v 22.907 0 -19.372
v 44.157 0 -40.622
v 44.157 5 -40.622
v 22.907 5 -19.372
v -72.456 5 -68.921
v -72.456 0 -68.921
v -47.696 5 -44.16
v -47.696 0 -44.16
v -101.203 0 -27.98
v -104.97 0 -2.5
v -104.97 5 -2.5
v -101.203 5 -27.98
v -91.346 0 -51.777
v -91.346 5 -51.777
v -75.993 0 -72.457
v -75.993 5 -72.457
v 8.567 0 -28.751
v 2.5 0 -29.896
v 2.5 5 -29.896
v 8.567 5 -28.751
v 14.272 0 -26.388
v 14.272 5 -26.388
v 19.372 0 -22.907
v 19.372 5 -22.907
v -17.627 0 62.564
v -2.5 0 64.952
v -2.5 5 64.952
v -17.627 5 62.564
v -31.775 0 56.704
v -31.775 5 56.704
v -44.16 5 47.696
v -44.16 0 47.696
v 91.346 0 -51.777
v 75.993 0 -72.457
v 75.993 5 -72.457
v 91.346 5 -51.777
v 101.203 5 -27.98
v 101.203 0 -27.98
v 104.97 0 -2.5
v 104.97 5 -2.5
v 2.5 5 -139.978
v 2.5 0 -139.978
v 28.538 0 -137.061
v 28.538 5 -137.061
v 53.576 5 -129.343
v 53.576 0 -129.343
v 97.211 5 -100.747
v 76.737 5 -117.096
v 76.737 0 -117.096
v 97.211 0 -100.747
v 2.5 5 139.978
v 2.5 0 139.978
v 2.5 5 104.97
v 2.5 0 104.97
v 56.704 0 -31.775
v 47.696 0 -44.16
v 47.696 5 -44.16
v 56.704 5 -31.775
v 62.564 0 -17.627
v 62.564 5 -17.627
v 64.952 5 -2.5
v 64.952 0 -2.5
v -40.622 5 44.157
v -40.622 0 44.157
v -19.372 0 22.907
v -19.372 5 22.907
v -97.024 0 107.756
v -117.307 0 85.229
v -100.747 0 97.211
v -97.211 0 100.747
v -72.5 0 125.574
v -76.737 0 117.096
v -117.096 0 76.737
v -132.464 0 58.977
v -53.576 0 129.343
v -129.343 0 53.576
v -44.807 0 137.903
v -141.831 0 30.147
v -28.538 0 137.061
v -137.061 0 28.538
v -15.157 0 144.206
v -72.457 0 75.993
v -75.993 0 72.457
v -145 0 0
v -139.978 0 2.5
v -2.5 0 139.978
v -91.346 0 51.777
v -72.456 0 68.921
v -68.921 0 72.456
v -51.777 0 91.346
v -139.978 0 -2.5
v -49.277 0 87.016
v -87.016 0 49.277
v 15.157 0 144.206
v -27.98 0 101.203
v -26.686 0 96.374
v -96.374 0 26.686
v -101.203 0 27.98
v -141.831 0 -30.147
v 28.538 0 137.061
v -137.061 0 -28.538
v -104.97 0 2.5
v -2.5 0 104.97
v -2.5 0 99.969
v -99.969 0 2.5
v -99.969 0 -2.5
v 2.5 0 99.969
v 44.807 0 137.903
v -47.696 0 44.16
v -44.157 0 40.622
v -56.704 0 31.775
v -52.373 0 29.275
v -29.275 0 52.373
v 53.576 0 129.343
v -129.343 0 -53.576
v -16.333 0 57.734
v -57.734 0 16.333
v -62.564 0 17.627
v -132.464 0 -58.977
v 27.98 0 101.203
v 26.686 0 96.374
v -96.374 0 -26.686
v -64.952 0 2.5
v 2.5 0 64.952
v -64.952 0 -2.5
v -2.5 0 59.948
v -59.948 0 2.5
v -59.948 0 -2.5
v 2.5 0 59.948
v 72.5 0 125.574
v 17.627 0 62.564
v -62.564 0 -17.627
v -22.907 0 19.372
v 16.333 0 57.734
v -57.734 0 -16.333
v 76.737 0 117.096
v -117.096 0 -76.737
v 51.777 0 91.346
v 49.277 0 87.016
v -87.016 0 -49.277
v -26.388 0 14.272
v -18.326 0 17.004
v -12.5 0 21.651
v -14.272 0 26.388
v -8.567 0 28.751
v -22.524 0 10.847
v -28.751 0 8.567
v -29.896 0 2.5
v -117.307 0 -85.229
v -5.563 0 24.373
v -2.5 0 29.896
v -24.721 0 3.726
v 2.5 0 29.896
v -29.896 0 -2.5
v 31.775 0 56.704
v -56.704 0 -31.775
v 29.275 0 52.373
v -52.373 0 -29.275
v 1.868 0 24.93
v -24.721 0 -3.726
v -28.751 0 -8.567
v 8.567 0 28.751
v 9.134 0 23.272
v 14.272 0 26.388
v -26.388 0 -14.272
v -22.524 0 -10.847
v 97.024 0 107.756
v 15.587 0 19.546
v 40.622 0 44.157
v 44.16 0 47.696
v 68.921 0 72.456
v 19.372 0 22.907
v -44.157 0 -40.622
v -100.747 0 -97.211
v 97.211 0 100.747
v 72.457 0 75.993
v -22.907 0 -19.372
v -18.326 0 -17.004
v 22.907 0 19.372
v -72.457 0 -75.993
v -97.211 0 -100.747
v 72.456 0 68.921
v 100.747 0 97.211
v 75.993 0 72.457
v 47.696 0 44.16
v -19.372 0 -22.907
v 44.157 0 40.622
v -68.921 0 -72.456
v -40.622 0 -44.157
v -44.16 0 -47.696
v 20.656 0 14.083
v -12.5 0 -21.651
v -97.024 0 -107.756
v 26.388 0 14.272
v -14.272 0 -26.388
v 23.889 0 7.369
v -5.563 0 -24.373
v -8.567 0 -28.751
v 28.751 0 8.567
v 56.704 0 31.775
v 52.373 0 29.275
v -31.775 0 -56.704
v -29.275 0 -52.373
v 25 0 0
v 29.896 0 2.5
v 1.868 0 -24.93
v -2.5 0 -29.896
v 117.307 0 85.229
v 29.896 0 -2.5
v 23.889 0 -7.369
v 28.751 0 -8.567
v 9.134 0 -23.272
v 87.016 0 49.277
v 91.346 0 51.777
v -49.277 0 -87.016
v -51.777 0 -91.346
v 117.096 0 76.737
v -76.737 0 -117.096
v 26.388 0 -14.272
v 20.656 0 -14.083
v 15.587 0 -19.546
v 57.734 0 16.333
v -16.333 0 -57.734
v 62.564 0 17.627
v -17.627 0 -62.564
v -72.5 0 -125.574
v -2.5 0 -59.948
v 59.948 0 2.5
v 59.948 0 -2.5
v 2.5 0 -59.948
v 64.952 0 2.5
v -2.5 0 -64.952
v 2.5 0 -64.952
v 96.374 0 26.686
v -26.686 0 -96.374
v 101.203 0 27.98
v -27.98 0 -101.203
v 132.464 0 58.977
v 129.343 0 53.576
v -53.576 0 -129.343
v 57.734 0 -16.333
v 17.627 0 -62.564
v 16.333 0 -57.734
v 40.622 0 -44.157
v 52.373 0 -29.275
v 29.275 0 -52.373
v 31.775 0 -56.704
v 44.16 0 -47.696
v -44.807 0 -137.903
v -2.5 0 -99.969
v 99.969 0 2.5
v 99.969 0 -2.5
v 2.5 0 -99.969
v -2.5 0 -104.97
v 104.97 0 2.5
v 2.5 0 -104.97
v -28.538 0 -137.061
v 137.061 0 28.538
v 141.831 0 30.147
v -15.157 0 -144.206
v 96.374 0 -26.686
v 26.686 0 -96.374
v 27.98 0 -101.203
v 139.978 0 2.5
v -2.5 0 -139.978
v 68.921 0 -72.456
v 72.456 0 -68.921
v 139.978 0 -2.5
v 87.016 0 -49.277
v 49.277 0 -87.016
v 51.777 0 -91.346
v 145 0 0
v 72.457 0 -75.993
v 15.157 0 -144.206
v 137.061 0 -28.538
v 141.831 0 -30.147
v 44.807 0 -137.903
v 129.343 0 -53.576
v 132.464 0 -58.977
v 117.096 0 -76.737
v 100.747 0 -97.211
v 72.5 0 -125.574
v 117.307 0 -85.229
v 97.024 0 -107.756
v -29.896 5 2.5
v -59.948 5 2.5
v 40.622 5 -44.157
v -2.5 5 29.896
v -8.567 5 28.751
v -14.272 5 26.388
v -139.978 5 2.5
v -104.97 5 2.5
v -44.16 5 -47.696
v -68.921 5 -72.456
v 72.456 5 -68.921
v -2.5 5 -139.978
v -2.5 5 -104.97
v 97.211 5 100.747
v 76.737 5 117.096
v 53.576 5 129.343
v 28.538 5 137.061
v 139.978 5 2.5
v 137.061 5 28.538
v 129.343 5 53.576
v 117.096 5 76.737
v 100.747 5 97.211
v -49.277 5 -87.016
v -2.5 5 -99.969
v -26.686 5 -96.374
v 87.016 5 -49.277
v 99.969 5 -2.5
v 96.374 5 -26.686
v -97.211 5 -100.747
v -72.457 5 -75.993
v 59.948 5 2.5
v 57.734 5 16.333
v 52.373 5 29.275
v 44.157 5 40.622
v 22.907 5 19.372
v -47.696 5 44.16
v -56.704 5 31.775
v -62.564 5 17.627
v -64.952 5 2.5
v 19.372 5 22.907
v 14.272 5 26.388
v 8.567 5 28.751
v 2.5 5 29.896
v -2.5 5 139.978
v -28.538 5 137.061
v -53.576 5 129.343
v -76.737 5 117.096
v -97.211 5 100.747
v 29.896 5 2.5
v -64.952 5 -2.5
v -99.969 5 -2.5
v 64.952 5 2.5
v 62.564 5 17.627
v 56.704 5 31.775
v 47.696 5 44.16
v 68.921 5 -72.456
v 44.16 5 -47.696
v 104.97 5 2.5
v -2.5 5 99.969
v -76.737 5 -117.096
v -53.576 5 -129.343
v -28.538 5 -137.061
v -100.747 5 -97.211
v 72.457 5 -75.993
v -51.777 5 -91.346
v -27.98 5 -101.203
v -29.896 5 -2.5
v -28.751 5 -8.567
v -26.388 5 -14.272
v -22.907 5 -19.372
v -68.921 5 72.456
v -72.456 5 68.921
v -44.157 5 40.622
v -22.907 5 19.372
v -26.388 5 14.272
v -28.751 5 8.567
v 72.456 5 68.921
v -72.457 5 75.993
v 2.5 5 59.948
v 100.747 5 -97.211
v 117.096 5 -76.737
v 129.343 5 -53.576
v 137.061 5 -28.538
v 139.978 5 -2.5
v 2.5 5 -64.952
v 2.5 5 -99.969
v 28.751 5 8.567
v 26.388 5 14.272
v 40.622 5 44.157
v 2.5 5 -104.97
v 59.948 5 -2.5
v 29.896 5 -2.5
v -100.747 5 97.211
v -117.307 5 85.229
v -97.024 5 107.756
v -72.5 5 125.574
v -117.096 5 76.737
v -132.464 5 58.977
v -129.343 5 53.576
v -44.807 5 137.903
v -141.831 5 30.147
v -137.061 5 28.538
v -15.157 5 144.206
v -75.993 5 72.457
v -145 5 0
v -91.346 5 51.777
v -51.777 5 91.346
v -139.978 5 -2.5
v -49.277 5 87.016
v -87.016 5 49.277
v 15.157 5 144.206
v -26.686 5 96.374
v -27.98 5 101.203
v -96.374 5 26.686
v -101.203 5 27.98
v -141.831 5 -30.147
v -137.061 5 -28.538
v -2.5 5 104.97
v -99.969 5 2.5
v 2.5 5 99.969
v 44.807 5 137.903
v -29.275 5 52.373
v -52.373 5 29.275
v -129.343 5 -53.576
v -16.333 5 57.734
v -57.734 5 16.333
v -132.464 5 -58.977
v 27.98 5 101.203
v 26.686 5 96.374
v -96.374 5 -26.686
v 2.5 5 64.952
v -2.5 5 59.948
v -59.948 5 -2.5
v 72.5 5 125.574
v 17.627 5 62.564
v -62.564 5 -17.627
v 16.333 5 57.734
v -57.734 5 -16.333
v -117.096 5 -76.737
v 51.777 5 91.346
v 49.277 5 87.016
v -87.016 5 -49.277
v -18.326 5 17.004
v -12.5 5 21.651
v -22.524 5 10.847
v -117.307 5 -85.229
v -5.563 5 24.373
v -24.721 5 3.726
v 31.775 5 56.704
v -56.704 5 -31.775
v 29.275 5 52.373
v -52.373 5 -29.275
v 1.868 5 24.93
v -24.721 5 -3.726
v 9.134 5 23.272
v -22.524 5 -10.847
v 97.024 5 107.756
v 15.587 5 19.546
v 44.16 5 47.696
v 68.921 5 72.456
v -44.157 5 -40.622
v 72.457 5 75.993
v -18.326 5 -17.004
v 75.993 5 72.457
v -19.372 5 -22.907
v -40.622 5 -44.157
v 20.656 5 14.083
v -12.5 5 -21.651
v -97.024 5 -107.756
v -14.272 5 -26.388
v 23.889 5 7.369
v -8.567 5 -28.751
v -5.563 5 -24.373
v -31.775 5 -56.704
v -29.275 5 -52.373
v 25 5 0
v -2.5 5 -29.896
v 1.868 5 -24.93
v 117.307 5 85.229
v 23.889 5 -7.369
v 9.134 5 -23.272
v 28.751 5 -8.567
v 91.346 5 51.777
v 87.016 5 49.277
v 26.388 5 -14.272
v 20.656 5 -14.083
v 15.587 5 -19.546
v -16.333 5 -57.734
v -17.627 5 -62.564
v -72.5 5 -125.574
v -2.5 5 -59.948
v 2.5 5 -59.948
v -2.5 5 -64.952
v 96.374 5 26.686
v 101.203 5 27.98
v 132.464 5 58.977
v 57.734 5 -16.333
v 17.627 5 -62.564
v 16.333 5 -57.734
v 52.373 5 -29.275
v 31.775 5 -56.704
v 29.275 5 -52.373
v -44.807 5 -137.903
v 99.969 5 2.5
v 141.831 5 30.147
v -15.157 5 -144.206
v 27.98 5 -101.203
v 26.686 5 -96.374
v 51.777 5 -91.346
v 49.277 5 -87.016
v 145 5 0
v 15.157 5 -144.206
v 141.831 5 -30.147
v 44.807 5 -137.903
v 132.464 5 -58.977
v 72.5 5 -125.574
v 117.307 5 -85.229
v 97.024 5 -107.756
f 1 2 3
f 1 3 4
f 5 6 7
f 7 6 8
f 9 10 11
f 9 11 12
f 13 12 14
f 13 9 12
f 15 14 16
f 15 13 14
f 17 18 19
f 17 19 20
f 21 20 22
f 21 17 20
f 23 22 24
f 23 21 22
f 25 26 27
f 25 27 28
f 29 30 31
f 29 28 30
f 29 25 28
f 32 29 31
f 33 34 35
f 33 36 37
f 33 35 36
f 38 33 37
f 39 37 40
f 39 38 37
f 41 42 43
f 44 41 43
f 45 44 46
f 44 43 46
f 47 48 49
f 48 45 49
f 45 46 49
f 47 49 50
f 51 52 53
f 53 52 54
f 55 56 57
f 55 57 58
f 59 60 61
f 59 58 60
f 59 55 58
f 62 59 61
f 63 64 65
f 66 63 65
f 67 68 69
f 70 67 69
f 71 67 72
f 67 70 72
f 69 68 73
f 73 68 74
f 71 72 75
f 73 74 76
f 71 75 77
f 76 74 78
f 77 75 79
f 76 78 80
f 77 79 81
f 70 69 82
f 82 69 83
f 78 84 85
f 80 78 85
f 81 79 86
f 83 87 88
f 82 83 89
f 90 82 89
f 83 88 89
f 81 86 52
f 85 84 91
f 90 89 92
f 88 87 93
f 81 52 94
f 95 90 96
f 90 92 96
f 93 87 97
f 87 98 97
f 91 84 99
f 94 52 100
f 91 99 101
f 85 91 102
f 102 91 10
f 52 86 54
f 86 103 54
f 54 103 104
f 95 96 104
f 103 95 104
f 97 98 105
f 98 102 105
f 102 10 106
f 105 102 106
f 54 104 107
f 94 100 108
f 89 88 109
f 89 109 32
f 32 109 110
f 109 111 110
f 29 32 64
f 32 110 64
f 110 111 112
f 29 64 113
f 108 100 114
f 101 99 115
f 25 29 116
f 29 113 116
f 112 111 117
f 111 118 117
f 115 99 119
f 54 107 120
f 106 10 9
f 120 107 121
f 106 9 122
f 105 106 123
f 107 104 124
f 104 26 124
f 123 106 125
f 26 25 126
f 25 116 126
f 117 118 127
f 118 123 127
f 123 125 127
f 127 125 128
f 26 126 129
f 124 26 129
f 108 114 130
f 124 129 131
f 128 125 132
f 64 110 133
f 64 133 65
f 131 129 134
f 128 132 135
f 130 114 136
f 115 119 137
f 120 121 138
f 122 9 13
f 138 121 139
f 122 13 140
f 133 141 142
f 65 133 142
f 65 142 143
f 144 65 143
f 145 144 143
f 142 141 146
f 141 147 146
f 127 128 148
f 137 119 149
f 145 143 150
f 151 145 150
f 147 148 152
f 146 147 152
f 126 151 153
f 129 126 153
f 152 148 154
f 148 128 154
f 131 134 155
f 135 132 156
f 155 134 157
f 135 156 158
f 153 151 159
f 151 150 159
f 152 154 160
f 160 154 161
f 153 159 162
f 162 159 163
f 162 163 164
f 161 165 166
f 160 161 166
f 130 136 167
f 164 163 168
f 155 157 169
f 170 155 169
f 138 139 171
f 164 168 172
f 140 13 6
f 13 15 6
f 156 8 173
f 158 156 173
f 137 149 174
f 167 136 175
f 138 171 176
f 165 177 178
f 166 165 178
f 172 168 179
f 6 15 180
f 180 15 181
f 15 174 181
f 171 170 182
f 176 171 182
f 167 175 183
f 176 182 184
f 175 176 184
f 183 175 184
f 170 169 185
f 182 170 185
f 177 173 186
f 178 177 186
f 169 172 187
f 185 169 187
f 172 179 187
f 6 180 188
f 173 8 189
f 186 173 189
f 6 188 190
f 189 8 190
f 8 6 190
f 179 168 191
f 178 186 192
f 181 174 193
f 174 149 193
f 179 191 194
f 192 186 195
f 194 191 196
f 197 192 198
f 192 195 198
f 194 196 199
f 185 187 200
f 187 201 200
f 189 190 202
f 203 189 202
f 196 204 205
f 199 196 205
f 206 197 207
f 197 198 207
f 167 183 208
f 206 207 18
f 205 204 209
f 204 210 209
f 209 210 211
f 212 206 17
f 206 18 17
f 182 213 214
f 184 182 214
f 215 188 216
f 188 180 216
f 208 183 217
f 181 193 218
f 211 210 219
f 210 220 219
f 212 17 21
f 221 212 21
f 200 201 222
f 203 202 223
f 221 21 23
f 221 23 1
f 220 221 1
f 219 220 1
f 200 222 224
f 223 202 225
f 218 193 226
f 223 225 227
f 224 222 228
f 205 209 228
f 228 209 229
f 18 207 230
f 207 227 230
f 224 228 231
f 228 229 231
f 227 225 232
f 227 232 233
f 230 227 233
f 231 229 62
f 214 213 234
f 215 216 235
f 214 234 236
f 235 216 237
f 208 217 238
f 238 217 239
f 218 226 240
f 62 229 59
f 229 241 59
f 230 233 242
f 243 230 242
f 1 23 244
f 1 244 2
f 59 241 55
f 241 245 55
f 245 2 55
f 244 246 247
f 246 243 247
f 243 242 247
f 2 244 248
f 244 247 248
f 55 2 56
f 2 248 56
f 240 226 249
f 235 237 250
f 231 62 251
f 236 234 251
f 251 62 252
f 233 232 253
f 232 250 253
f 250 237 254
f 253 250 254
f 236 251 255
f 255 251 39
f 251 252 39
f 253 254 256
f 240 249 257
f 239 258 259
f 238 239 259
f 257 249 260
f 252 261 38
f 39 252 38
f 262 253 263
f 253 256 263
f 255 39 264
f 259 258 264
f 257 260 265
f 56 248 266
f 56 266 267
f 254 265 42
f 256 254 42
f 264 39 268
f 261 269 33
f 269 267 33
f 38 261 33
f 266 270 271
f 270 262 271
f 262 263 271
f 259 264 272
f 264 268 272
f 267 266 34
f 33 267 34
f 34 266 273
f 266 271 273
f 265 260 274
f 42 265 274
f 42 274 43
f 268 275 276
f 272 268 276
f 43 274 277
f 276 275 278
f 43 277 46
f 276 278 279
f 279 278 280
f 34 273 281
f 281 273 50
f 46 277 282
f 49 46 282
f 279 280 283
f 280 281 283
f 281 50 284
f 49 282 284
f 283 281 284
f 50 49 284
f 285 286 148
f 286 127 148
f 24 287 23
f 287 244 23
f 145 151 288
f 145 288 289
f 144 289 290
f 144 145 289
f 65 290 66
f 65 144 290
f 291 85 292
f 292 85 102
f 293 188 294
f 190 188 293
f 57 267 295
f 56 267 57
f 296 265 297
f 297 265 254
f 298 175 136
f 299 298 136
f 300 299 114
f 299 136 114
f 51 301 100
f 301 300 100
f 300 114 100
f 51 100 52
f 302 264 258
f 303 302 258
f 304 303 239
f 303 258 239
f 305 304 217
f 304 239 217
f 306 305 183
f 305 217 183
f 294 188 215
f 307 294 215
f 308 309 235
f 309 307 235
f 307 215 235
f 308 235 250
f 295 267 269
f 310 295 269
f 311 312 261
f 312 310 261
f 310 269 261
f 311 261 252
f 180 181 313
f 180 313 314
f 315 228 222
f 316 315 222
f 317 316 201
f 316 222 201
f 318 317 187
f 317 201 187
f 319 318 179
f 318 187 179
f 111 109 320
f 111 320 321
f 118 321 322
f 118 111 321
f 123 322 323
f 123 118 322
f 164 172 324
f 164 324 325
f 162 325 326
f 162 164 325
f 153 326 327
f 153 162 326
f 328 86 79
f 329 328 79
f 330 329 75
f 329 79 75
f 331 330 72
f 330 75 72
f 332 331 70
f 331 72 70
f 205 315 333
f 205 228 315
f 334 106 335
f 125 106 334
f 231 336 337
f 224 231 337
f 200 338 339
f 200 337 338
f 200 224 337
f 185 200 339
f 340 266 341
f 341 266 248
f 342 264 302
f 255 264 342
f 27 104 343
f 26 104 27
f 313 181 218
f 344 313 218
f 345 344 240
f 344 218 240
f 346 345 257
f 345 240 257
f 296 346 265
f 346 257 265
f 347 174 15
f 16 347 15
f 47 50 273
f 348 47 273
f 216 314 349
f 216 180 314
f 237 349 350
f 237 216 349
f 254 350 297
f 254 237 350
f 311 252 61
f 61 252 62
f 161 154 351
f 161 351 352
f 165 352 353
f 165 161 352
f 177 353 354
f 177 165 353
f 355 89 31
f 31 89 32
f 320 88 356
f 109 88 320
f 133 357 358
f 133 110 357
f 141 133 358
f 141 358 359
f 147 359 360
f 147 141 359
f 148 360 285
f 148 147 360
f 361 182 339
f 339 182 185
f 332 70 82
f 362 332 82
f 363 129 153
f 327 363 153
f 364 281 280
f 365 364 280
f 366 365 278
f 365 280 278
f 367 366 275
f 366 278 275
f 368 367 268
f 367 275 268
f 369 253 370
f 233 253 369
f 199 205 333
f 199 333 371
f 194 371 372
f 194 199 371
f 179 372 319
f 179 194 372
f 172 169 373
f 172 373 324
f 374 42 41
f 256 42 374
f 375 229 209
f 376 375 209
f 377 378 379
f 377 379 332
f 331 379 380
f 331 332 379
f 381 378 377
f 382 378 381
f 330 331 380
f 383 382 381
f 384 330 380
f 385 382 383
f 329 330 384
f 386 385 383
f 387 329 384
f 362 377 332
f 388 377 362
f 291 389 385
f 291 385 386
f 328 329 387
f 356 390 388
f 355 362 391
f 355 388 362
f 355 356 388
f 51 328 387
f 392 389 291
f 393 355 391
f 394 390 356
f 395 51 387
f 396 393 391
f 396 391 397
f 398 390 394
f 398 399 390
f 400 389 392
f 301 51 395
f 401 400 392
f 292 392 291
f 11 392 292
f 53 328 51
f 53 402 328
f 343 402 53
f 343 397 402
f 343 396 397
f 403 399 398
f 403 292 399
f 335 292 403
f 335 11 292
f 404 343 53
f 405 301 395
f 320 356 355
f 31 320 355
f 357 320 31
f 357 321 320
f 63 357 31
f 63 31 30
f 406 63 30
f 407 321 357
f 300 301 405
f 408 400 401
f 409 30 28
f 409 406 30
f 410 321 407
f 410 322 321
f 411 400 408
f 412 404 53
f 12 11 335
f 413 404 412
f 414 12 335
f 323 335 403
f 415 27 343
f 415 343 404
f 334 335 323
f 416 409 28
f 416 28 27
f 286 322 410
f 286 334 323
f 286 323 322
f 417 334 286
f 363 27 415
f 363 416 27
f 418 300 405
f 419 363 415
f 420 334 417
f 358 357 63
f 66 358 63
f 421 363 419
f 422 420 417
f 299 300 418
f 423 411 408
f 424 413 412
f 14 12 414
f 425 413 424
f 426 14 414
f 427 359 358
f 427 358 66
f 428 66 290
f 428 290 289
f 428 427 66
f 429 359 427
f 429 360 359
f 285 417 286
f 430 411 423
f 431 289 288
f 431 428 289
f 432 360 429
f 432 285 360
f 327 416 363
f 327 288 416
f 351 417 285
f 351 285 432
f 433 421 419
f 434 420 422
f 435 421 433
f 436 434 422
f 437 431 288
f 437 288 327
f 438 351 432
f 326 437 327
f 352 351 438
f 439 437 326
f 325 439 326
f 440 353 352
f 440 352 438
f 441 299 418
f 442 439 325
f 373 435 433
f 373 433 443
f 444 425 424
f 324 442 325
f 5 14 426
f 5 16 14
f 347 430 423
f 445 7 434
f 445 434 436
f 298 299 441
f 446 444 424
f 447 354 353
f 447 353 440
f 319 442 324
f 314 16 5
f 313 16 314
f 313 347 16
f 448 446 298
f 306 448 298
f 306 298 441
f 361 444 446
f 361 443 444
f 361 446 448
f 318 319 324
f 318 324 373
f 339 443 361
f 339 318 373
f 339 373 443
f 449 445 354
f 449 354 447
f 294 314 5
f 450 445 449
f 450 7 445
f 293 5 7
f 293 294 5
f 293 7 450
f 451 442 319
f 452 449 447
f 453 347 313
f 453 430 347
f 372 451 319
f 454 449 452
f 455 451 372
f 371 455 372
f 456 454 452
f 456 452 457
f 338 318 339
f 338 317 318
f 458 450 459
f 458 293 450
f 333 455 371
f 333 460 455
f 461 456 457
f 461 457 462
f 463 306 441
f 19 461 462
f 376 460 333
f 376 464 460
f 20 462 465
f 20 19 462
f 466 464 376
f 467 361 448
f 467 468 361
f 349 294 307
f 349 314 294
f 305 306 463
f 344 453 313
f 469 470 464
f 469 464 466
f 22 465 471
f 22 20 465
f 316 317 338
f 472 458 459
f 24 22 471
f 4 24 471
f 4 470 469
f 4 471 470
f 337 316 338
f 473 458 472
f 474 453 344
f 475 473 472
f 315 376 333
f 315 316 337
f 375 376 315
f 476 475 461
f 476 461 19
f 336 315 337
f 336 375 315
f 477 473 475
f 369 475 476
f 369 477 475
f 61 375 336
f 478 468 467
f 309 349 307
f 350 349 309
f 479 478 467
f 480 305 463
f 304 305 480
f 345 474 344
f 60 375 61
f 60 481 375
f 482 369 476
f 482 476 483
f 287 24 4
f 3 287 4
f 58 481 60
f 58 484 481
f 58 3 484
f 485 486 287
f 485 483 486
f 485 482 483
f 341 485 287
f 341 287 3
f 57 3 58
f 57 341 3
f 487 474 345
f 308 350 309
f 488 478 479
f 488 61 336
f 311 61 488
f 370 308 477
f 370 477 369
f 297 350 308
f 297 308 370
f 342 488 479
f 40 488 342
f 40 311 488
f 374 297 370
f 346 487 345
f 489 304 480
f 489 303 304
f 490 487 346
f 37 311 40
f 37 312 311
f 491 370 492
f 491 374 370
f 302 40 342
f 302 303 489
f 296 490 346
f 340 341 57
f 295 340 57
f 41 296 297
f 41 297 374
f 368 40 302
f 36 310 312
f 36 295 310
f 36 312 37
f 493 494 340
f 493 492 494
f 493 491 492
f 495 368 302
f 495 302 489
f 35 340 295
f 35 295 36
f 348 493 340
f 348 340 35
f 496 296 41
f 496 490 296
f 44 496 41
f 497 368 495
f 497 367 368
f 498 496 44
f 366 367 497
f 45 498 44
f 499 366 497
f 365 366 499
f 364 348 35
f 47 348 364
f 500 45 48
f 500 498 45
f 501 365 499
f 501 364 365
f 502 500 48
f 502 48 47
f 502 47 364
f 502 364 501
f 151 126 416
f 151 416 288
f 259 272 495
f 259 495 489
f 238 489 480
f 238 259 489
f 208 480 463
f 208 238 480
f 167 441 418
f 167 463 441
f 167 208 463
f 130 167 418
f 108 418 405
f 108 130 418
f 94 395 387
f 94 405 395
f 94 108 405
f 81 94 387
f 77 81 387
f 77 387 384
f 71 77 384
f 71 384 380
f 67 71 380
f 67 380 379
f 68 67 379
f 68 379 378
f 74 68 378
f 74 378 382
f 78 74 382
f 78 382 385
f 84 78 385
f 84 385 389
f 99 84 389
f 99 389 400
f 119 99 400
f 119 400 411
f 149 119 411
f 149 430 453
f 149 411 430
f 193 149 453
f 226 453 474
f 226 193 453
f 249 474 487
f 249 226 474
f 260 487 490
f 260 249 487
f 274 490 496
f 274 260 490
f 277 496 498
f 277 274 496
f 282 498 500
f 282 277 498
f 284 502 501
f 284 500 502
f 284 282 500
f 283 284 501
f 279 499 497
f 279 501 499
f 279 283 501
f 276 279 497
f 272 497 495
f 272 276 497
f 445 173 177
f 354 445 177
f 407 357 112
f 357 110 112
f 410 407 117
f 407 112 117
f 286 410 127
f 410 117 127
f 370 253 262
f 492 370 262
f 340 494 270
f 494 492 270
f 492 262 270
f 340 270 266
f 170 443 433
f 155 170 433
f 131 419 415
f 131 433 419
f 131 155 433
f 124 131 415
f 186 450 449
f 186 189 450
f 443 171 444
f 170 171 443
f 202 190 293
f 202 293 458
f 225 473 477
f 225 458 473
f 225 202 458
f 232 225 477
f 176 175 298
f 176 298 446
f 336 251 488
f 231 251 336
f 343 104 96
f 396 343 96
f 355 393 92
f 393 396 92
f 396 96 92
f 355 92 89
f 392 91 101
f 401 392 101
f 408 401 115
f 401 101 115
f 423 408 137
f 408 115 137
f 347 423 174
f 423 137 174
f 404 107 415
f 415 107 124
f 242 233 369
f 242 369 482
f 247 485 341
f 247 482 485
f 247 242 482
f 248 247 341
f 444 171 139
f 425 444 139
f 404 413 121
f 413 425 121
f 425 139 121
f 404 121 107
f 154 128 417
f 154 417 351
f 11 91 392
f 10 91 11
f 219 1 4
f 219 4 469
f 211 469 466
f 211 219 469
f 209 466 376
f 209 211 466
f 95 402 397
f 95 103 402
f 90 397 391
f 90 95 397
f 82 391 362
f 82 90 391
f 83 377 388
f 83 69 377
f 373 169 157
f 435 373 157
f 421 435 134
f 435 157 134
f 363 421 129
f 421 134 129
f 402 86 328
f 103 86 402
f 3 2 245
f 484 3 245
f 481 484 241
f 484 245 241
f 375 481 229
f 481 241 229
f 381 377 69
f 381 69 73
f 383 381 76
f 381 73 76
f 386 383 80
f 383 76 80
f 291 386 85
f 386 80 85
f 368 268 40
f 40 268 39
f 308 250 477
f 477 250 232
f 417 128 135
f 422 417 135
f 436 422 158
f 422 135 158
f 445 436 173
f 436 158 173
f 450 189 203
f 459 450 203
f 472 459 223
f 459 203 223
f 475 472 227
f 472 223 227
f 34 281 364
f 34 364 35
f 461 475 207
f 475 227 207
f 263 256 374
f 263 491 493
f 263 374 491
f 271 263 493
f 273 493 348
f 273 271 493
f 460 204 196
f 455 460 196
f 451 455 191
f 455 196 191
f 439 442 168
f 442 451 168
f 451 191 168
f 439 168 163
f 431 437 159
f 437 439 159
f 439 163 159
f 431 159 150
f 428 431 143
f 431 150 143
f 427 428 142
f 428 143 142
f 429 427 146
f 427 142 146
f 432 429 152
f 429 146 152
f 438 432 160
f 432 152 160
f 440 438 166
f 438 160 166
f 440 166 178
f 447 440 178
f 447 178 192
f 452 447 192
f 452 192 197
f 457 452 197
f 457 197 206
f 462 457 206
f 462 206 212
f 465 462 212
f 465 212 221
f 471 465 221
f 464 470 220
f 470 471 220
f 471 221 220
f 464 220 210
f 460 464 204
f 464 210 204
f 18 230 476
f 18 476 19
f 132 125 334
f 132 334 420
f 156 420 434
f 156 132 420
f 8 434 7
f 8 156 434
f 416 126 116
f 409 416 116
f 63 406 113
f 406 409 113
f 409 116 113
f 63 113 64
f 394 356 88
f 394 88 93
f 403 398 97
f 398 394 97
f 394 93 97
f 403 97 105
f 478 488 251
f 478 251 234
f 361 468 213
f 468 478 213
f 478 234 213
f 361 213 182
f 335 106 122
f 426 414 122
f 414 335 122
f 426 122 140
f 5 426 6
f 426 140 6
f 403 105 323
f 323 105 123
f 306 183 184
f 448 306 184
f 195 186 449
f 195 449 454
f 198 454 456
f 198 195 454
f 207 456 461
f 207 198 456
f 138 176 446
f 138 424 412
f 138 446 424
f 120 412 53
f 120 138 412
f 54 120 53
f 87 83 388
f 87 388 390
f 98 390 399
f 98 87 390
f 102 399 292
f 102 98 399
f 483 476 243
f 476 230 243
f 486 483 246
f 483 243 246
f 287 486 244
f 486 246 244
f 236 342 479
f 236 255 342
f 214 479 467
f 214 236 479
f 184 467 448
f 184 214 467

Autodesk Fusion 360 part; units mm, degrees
sketch "Sketch1" plane through (0, 0, 0) normal (0, 1, 0) x (1, 0, 0)
  circle A0 centre (0, 0) radius 145
  circle A1 centre (0, 0) radius 140
  circle A2 centre (0, 0) radius 25
  circle A3 centre (0, 0) radius 30
  line L0 (-2.5, 140) -> (-2.5, 29.8957)
  line L1 (2.5, 140) -> (2.5, 29.8957)
  circle A4 centre (0, 0) radius 105
  circle A5 centre (0, 0) radius 100
  circle A6 centre (0, 0) radius 65
  circle A7 centre (0, 0) radius 60
  line L2 (-97.2272, 100.7627) -> (-19.3717, 22.9072)
  line L3 (-100.7627, 97.2272) -> (-22.9072, 19.3717)
  line L4 (-140, 2.5) -> (-29.8957, 2.5)
  line L5 (-140, -2.5) -> (-29.8957, -2.5)
  line L6 (-100.7627, -97.2272) -> (-22.9072, -19.3717)
  line L7 (-97.2272, -100.7627) -> (-19.3717, -22.9072)
  line L8 (-2.5, -140) -> (-2.5, -29.8957)
  line L9 (2.5, -140) -> (2.5, -29.8957)
  line L10 (97.2272, -100.7627) -> (19.3717, -22.9072)
  line L11 (100.7627, -97.2272) -> (22.9072, -19.3717)
  line L12 (140, -2.5) -> (29.8957, -2.5)
  line L13 (140, 2.5) -> (29.8957, 2.5)
  line L14 (100.7627, 97.2272) -> (22.9072, 19.3717)
  line L15 (97.2272, 100.7627) -> (19.3717, 22.9072)
  dimension "d1" = 290
  dimension "d2" = 280
  dimension "d3" = 50
  dimension "d4" = 60
  dimension "d7" = 210
  dimension "d8" = 130
  dimension "d10" = 360
extrude "Extrude1" add sketch "Sketch1" along normal blind 5 contours A0 | A1 A4 L12 L13 | A1 A4 L14 L15 | A4 A5 L13 L14 | A4 A5 L12 L13 | A1 A4 L10 L11 | A4 A5 L11 L12 | A4 A5 L14 L15 | A5 A6 L12 L13 | A4 A5 L10 L11 | A1 L0 L1 A4 | L1 A4 A5 L15 | A5 A6 L14 L15 | A6 A7 L13 L14 | A6 A7 L12 L13 | A1 A4 L8 L9 | A4 A5 L9 L10 | A5 A6 L10 L11 | A6 A7 L11 L12 | L0 L1 A4 A5 | A6 A7 L14 L15 | A3 A7 L12 L13 | A4 A5 L8 L9 | A6 A7 L10 L11 | A1 A4 L2 L3 | L0 A4 A5 L2 | L0 L1 A5 A6 | L1 A6 A7 L15 | A3 A7 L14 L15 | A3 | A1 A4 L6 L7 | A4 A5 L7 L8 | A5 A6 L8 L9 | A6 A7 L9 L10 | A3 A7 L10 L11 | A4 A5 L2 L3 | L0 L1 A6 A7 | A4 A5 L6 L7 | A6 A7 L8 L9 | A1 A4 L4 L5 | A4 A5 L3 L4 | A5 A6 L2 L3 | L0 A6 A7 L2 | A3 L0 L1 A7 | A4 A5 L5 L6 | A5 A6 L6 L7 | A6 A7 L7 L8 | A3 A7 L8 L9 | A4 A5 L4 L5 | A6 A7 L2 L3 | A6 A7 L6 L7 | A5 A6 L4 L5 | A6 A7 L3 L4 | A3 A7 L2 L3 | A6 A7 L5 L6 | A3 A7 L6 L7 | A6 A7 L4 L5 | A3 A7 L4 L5
